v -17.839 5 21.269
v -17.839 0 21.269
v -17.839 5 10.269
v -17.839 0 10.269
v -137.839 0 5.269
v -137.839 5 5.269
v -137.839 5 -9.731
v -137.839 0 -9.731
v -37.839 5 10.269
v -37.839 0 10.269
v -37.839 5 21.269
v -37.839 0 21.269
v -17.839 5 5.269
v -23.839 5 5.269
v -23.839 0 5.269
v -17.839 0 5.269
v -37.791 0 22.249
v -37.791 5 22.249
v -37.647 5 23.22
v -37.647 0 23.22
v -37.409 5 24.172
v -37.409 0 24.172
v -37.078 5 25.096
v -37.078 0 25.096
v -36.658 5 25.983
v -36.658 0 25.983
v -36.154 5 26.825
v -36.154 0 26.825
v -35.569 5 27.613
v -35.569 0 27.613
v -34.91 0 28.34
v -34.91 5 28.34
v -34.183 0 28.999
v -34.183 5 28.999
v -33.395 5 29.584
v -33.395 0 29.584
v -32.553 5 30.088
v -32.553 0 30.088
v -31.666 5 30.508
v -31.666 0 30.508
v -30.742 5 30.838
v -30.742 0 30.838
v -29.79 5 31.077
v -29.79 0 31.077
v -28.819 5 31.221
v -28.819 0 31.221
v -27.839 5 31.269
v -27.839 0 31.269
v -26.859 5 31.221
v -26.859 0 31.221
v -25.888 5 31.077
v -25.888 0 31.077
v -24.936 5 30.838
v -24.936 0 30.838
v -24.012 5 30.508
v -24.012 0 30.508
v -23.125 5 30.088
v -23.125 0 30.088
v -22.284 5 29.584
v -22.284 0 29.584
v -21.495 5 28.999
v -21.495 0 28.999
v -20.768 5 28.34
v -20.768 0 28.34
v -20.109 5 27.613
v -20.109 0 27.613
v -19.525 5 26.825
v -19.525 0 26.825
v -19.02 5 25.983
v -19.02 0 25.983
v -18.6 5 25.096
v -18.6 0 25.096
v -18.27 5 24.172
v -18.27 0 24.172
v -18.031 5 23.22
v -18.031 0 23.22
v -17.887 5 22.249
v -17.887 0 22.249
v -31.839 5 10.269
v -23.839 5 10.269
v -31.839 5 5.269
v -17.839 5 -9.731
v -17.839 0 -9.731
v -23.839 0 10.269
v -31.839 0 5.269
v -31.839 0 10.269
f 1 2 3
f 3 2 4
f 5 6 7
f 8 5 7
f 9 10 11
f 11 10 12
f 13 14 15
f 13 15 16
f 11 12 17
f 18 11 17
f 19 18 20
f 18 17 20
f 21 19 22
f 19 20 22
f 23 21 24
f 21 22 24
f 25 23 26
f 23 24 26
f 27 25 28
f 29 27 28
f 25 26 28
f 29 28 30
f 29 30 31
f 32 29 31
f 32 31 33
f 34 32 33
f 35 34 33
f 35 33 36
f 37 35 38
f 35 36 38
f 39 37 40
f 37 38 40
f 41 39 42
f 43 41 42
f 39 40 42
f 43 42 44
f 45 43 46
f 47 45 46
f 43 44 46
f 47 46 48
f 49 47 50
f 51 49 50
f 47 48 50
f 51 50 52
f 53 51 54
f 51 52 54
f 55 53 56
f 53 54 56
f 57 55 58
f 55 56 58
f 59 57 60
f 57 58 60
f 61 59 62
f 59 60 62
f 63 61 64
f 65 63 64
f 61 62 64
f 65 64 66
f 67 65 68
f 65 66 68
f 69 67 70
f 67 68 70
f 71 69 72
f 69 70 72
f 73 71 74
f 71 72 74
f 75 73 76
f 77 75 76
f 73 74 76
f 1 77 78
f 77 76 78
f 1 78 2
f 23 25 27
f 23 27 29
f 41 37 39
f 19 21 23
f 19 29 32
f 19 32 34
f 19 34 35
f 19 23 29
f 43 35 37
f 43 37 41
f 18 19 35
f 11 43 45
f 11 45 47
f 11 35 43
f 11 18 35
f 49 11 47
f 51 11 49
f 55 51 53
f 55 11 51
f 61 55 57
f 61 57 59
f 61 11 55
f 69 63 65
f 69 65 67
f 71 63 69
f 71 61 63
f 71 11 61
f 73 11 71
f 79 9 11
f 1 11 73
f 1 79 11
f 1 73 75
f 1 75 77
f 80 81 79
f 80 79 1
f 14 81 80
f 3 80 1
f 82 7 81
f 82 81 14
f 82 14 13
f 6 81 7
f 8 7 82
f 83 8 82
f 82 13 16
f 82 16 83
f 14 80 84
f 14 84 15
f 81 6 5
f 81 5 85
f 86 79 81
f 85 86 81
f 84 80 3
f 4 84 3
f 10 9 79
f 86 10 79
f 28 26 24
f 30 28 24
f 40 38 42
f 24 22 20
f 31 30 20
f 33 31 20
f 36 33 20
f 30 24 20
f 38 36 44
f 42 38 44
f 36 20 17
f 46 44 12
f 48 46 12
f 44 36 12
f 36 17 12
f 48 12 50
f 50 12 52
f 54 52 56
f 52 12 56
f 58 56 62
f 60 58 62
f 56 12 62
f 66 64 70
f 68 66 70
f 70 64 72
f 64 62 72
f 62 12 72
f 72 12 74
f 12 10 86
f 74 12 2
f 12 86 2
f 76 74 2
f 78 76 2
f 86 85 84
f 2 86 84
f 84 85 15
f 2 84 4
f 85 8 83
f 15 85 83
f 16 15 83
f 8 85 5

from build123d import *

# Parameters (mm, degrees)
RESSALTO_EXTRUS_O1_DEPTH = 5
ESBO_O2_W                = 6
ESBO_O2_H                = 5
CORTE_EXTRUS_O1_DEPTH    = 10
ESBO_O3_W                = 120
ESBO_O3_H                = 15
RESSALTO_EXTRUS_O2_DEPTH = 5


with BuildPart() as part:
    # Esboço1 → Ressalto-extrusão1 (new body)
    with BuildSketch(Plane(origin=(0, 0, 0), x_dir=(1, 0, 0), z_dir=(0, 1, 0))):
        with BuildLine():
            ThreePointArc((-17.839278071, -21.26900995), (-27.839278071, -11.26900995), (-37.839278071, -21.26900995))
            Line((-37.839278071, -21.26900995), (-17.839278071, -21.26900995))
        make_face()
        with BuildLine():
            Line((-17.839278071, -21.26900995), (-37.839278071, -21.26900995))
            ThreePointArc((-37.839278071, -21.26900995), (-27.839278071, -31.26900995), (-17.839278071, -21.26900995))
        make_face()
        with BuildLine():
            Line((-17.839278071, -5.26900995), (-37.839278071, -5.26900995))
            Line((-37.839278071, -5.26900995), (-37.839278071, -21.26900995))
            ThreePointArc((-37.839278071, -21.26900995), (-27.839278071, -11.26900995), (-17.839278071, -21.26900995))
            Line((-17.839278071, -21.26900995), (-17.839278071, -5.26900995))
        make_face()
    extrude(amount=RESSALTO_EXTRUS_O1_DEPTH)

    # Esboço2 → Corte-extrusão1 (cut)
    with BuildSketch(Plane(origin=(0, 5, 0), x_dir=(1, 0, 0), z_dir=(0, 1, 0))):
        with Locations((-34.839278071, -7.76900995)):
            Rectangle(ESBO_O2_W, ESBO_O2_H)
        with Locations((-20.839278071, -7.76900995)):
            Rectangle(ESBO_O2_W, ESBO_O2_H)
    extrude(amount=-CORTE_EXTRUS_O1_DEPTH, mode=Mode.SUBTRACT)

    # Esboço3 → Ressalto-extrusão2 (add)
    with BuildSketch(Plane(origin=(0, 5, 0), x_dir=(1, 0, 0), z_dir=(0, 1, 0))):
        with Locations((-77.839278071, 2.23099005)):
            Rectangle(ESBO_O3_W, ESBO_O3_H)
    extrude(amount=-RESSALTO_EXTRUS_O2_DEPTH)


solid = part.part
